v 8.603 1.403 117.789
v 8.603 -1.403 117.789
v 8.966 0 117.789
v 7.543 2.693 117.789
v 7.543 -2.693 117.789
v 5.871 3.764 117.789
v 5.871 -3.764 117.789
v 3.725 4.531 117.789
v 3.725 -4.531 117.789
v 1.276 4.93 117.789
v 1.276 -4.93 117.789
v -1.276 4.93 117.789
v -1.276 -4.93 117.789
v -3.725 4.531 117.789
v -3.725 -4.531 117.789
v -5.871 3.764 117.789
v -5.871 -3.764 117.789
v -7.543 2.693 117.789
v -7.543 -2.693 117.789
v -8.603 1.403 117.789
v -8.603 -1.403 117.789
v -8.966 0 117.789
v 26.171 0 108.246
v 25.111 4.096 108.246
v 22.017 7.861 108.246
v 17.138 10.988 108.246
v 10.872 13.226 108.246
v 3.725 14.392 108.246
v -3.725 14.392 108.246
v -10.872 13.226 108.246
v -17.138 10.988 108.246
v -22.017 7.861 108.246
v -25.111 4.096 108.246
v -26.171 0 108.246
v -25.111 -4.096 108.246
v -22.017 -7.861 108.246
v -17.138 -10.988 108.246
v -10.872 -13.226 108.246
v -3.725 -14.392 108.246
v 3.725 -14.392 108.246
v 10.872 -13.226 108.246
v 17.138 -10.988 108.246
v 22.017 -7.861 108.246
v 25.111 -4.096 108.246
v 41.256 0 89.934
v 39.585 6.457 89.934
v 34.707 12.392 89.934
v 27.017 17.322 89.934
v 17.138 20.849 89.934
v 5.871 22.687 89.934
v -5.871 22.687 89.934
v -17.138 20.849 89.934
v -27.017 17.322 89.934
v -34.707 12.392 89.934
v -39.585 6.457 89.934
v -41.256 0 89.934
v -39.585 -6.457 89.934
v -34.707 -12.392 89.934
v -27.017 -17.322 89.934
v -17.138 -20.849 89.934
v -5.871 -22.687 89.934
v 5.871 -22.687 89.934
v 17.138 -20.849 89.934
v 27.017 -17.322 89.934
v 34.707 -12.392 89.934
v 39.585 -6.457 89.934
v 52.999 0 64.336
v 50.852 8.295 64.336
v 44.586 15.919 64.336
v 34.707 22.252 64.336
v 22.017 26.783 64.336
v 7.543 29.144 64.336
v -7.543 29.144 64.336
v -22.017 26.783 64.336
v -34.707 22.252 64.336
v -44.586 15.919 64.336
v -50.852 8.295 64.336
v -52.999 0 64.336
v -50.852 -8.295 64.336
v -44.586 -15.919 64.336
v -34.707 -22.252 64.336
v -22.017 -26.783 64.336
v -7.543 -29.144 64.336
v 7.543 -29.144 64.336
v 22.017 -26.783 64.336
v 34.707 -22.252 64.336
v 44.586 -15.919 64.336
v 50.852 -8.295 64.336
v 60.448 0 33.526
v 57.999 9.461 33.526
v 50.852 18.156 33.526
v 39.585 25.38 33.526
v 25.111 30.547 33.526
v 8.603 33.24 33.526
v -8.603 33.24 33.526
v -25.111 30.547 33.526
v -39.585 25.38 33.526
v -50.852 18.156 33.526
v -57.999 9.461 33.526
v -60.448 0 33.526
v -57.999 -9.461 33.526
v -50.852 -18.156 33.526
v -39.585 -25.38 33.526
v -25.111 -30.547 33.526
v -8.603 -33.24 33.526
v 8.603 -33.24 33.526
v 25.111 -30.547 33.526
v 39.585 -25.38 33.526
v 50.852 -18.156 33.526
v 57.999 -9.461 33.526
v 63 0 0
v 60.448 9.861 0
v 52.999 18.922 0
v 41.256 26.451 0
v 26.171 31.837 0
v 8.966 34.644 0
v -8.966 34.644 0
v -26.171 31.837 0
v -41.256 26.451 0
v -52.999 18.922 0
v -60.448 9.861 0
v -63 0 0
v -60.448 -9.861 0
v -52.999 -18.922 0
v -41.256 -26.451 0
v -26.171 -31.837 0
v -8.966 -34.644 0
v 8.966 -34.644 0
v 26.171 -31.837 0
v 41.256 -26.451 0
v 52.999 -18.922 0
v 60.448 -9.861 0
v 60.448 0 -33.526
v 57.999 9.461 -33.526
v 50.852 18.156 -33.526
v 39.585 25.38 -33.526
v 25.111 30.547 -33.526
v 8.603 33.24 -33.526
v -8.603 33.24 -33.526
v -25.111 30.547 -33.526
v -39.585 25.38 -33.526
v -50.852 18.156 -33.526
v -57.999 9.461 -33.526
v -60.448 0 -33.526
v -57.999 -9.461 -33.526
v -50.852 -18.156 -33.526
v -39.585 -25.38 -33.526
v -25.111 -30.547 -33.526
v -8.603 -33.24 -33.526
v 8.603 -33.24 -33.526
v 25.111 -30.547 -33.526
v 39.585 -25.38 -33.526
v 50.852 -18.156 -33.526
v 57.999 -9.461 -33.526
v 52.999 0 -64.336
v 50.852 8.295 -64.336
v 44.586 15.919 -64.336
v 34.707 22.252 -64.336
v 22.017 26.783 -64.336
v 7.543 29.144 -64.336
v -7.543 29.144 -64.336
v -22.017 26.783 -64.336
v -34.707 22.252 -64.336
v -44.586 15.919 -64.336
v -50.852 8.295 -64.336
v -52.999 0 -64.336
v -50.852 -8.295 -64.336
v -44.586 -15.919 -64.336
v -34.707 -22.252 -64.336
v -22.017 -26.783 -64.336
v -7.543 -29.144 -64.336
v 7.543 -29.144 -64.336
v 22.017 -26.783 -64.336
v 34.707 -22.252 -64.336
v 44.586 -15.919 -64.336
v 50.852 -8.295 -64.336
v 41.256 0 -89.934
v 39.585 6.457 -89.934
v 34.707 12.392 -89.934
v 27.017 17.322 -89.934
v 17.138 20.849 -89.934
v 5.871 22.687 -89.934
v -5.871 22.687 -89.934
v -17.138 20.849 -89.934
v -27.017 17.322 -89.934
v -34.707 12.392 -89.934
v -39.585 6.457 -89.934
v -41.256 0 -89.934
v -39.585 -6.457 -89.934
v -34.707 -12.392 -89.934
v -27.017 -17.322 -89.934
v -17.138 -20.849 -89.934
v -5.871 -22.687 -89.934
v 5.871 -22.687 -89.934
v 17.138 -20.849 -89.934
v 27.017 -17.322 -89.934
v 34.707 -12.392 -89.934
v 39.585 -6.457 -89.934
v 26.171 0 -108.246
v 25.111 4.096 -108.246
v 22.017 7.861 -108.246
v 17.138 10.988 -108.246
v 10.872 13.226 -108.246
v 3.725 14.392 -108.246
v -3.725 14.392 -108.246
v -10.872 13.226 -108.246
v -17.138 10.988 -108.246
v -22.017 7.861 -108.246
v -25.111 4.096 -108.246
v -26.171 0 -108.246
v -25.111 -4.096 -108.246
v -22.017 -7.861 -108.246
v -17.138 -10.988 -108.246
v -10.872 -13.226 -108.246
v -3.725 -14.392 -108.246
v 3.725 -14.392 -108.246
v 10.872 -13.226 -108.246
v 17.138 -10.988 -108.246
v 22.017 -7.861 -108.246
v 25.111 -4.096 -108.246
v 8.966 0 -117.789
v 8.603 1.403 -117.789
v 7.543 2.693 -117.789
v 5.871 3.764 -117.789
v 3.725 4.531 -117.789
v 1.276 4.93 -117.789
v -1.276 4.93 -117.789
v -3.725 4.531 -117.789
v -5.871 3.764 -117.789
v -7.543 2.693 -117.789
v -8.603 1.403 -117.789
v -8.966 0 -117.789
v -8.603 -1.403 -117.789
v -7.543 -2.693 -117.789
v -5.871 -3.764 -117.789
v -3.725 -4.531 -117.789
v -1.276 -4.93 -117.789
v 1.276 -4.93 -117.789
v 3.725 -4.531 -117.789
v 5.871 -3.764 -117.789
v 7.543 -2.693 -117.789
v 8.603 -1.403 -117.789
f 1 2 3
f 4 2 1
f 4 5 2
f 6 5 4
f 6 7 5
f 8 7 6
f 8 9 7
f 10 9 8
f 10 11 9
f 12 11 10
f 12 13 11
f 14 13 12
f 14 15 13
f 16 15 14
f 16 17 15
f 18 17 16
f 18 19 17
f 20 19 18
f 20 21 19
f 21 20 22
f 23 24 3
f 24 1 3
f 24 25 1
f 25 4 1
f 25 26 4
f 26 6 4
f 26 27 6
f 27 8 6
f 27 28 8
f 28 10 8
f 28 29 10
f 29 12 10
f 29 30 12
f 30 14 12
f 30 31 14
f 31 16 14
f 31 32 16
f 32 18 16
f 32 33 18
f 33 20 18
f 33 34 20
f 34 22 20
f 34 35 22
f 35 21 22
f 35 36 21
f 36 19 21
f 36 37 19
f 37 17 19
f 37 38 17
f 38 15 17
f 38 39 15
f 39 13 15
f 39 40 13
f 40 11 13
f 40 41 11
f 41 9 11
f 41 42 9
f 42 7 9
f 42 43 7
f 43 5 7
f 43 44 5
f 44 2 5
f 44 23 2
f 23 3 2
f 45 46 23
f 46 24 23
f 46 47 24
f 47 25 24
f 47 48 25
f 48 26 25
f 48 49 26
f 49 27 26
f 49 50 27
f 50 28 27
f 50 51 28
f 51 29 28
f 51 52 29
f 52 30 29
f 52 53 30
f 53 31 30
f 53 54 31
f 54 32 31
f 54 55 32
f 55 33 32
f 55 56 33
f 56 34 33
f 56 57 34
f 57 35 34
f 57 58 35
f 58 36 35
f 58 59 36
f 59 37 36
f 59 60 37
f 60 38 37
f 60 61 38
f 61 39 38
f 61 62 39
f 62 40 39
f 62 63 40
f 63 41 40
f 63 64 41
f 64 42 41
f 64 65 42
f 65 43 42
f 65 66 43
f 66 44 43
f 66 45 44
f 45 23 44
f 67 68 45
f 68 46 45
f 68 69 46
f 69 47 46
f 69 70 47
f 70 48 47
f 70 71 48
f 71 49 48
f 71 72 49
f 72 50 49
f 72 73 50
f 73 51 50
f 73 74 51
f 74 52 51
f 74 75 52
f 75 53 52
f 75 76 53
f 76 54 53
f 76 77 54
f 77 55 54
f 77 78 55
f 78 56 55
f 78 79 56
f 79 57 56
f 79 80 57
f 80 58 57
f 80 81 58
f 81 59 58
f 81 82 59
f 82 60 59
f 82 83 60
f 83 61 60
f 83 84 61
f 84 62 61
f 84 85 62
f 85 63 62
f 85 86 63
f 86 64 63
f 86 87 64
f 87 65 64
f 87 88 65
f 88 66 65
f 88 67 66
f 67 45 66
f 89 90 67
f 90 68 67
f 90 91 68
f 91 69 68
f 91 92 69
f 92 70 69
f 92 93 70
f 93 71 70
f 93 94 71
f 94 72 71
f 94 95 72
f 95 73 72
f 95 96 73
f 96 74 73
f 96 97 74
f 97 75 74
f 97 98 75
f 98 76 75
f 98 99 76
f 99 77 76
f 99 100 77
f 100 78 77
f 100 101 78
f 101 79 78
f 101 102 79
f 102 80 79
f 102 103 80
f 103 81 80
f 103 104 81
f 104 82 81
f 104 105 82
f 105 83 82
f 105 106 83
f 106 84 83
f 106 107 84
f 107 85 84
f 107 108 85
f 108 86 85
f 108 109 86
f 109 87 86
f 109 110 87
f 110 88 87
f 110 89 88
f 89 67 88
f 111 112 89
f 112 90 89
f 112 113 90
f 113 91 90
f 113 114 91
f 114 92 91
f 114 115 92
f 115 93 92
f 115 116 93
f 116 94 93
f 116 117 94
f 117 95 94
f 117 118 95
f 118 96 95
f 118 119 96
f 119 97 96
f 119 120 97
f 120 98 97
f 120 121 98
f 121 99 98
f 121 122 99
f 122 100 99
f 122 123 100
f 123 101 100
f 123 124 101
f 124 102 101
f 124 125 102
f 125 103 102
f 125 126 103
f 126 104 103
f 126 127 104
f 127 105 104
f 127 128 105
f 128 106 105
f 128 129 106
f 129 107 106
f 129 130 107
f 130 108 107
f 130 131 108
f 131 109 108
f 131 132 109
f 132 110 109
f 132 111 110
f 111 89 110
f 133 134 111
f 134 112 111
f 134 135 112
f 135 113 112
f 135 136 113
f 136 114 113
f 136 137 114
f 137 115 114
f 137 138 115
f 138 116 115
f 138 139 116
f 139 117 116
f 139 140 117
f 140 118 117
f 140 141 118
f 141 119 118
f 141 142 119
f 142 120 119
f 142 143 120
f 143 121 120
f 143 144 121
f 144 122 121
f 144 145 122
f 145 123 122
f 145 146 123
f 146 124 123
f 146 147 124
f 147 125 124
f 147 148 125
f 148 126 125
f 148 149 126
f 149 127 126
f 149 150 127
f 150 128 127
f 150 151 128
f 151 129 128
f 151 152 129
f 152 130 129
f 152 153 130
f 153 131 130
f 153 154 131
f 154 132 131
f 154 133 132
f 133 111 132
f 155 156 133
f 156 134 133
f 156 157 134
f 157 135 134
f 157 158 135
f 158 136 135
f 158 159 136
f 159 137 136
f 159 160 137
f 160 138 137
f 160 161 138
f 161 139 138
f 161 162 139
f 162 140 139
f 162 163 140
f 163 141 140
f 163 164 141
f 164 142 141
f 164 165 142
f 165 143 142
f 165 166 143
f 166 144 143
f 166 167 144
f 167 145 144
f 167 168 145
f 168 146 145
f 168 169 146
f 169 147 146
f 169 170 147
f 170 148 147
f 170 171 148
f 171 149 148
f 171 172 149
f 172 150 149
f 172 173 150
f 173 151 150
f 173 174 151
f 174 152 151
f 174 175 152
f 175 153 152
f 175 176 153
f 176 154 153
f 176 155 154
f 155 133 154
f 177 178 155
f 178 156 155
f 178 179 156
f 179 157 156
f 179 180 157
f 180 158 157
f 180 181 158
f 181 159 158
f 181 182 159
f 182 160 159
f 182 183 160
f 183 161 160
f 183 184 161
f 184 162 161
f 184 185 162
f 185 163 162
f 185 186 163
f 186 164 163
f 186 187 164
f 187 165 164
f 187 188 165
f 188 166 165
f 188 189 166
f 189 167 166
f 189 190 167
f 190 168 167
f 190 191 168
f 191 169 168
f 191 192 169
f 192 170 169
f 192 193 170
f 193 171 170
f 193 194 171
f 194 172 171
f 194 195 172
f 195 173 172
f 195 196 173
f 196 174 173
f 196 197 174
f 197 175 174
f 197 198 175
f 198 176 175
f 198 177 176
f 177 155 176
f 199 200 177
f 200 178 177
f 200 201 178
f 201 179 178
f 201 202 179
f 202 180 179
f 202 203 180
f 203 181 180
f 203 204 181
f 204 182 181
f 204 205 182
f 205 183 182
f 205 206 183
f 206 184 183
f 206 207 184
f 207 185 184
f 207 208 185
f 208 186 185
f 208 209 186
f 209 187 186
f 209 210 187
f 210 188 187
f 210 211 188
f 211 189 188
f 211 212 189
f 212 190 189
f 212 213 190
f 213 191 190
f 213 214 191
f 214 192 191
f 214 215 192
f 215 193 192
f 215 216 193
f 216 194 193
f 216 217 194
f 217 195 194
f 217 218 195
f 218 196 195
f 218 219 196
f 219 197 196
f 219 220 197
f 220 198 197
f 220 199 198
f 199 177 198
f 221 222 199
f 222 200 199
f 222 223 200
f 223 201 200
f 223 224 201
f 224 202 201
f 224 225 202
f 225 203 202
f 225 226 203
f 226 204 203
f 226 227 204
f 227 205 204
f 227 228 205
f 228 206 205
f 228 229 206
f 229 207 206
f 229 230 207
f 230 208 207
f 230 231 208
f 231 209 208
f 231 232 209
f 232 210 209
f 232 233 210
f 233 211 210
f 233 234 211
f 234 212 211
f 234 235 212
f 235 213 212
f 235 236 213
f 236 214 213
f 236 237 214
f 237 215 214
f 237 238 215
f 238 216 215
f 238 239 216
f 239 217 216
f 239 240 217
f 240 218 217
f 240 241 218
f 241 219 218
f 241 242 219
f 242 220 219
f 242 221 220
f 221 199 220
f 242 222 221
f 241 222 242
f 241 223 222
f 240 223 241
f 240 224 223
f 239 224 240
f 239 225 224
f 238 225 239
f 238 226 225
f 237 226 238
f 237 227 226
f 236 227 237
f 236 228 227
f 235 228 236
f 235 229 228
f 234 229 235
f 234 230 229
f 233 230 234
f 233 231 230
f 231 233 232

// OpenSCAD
// Generated by SolidPython 1.0.1 on 2020-07-29 00:46:48


scale(v = [9, 5, 17]) {
	sphere(r = 7);
}
/***********************************************
*********      SolidPython code:      **********
************************************************
 
# import packages: SolidPython
from solid import *
from solid.utils import *
from itertools import chain, combinations, permutations


class Resize:

    def __init__(self, scad_file):
        self.scad_file = scad_file
        #self.scad_file = import_scad(scad_file)
        # cone/cylinder param:
        self.r1 = 0
        self.r2 = 0
        self.h = 0
        # rectangular prism param:
        self.w = 0
        self.l = 0
        # ellipse param:
        self.r = 0

    # import OpenScad code (file name corresponds to shape)


    # classify shape + parameters
    def assign(self, param1, param2, param3):
        if self.scad_file == 'cone.scad':
            self.r1 = param1
            self.r2 = param2
            self.h = param3
        elif self.scad_file == 'cylinder.scad':
            self.r1 = param1
            self.r2 = param2
            self.h = param3
        elif self.scad_file == 'rectangularPrism.scad':
            self.h = param1
            self.l = param2
            self.w = param3
        else:
            self.r = param1
            self.h = param2

    # resize parameters
    def iterate(self):
        x = range(3, 20, 2)
        i = 1
        if self.scad_file == 'cone.scad':
            tempList = list(permutations(x, 2))
            for temp in tempList:
                param1 = temp[0]
                param2 = temp[1]
                filepath = 'produced_scad_files/' + 'cone' + str(param1) + '_' + str(param2) + '_' + '.scad'
                scad_render_to_file(cylinder(h=param1, r1=param2, r2=0), filepath)

        elif self.scad_file == 'cylinder.scad':
            tempList = list(permutations(x, 3))
            for temp in tempList:
                param1 = temp[0]
                param2 = temp[1]
                filepath = 'produced_scad_files/' + 'cylinder' + str(param1) + '_' + str(param2) + '_' + '.scad'
                scad_render_to_file(cylinder(h=param1, r1=param2, r2=param2), filepath)

        elif self.scad_file == 'rectangularPrism.scad':
            tempList = list(permutations(x, 3))
            for temp in tempList:
                param1 = temp[0]
                param2 = temp[1]
                param3 = temp[2]
                filepath = 'produced_scad_files/' + 'rectangularPrism' + str(param1) + '_' + str(param2) + '_' + str(
                    param3) + '.scad'
                scad_render_to_file(cube(size=(param1, param2, param3)), filepath)

        elif self.scad_file == 'ellipse.scad':
            tempList = list(permutations(x, 4))
            for temp in tempList:
                param1 = temp[0]
                param2 = temp[1]
                param3 = temp[2]
                param4 = temp[3]
                filepath = 'produced_scad_files/' + 'ellipse' + str(param1) + '_' + str(param2) + '_' + str(param3) + '_' + str(param4) + '.scad'
                scad_render_to_file(scale([param1, param2, param3])(sphere(r=param4)), filepath)

    def render_to_scadfile(self):
        scad_render_to_file(scad, 'example.scad') 
 
************************************************/
